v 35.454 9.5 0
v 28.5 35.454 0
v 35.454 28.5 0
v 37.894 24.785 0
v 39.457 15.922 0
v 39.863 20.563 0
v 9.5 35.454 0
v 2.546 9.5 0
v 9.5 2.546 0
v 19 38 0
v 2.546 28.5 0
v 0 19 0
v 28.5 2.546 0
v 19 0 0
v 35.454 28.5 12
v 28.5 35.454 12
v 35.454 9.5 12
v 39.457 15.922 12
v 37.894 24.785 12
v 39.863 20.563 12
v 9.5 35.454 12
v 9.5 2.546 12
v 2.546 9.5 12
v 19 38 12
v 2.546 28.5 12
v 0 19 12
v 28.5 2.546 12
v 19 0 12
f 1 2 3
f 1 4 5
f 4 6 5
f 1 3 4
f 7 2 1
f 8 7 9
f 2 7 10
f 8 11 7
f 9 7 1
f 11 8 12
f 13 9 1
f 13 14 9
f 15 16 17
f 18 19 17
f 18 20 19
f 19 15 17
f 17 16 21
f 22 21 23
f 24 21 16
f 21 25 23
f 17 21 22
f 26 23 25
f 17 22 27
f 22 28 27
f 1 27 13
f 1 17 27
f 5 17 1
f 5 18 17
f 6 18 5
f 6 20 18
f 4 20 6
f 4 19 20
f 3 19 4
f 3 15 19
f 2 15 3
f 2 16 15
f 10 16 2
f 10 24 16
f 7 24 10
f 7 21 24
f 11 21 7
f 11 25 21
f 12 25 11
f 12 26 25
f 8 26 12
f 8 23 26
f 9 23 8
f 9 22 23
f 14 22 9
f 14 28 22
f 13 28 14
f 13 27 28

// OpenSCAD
$fn = 32;

// ----------------------------------------------------------------------
// Eccentric disc: step, 12 mm thick
// ----------------------------------------------------------------------

// --- parameters (mm) ---
profile_height = 12;      // extrusion height
profile_points = 14;      // points of the closed outline

profile = [[0, 19], [2.546, 9.5], [9.5, 2.546], [19, 0], [28.5, 2.546], [35.454, 9.5], [39.457, 15.922], [39.863, 20.563], [37.894, 24.785], [35.454, 28.5], [28.5, 35.454], [19, 38], [9.5, 35.454], [2.546, 28.5]];  // single closed polygon, 14 points, counter clockwise

// --- the one profile operation ---
linear_extrude(height = profile_height) polygon(points = profile);
